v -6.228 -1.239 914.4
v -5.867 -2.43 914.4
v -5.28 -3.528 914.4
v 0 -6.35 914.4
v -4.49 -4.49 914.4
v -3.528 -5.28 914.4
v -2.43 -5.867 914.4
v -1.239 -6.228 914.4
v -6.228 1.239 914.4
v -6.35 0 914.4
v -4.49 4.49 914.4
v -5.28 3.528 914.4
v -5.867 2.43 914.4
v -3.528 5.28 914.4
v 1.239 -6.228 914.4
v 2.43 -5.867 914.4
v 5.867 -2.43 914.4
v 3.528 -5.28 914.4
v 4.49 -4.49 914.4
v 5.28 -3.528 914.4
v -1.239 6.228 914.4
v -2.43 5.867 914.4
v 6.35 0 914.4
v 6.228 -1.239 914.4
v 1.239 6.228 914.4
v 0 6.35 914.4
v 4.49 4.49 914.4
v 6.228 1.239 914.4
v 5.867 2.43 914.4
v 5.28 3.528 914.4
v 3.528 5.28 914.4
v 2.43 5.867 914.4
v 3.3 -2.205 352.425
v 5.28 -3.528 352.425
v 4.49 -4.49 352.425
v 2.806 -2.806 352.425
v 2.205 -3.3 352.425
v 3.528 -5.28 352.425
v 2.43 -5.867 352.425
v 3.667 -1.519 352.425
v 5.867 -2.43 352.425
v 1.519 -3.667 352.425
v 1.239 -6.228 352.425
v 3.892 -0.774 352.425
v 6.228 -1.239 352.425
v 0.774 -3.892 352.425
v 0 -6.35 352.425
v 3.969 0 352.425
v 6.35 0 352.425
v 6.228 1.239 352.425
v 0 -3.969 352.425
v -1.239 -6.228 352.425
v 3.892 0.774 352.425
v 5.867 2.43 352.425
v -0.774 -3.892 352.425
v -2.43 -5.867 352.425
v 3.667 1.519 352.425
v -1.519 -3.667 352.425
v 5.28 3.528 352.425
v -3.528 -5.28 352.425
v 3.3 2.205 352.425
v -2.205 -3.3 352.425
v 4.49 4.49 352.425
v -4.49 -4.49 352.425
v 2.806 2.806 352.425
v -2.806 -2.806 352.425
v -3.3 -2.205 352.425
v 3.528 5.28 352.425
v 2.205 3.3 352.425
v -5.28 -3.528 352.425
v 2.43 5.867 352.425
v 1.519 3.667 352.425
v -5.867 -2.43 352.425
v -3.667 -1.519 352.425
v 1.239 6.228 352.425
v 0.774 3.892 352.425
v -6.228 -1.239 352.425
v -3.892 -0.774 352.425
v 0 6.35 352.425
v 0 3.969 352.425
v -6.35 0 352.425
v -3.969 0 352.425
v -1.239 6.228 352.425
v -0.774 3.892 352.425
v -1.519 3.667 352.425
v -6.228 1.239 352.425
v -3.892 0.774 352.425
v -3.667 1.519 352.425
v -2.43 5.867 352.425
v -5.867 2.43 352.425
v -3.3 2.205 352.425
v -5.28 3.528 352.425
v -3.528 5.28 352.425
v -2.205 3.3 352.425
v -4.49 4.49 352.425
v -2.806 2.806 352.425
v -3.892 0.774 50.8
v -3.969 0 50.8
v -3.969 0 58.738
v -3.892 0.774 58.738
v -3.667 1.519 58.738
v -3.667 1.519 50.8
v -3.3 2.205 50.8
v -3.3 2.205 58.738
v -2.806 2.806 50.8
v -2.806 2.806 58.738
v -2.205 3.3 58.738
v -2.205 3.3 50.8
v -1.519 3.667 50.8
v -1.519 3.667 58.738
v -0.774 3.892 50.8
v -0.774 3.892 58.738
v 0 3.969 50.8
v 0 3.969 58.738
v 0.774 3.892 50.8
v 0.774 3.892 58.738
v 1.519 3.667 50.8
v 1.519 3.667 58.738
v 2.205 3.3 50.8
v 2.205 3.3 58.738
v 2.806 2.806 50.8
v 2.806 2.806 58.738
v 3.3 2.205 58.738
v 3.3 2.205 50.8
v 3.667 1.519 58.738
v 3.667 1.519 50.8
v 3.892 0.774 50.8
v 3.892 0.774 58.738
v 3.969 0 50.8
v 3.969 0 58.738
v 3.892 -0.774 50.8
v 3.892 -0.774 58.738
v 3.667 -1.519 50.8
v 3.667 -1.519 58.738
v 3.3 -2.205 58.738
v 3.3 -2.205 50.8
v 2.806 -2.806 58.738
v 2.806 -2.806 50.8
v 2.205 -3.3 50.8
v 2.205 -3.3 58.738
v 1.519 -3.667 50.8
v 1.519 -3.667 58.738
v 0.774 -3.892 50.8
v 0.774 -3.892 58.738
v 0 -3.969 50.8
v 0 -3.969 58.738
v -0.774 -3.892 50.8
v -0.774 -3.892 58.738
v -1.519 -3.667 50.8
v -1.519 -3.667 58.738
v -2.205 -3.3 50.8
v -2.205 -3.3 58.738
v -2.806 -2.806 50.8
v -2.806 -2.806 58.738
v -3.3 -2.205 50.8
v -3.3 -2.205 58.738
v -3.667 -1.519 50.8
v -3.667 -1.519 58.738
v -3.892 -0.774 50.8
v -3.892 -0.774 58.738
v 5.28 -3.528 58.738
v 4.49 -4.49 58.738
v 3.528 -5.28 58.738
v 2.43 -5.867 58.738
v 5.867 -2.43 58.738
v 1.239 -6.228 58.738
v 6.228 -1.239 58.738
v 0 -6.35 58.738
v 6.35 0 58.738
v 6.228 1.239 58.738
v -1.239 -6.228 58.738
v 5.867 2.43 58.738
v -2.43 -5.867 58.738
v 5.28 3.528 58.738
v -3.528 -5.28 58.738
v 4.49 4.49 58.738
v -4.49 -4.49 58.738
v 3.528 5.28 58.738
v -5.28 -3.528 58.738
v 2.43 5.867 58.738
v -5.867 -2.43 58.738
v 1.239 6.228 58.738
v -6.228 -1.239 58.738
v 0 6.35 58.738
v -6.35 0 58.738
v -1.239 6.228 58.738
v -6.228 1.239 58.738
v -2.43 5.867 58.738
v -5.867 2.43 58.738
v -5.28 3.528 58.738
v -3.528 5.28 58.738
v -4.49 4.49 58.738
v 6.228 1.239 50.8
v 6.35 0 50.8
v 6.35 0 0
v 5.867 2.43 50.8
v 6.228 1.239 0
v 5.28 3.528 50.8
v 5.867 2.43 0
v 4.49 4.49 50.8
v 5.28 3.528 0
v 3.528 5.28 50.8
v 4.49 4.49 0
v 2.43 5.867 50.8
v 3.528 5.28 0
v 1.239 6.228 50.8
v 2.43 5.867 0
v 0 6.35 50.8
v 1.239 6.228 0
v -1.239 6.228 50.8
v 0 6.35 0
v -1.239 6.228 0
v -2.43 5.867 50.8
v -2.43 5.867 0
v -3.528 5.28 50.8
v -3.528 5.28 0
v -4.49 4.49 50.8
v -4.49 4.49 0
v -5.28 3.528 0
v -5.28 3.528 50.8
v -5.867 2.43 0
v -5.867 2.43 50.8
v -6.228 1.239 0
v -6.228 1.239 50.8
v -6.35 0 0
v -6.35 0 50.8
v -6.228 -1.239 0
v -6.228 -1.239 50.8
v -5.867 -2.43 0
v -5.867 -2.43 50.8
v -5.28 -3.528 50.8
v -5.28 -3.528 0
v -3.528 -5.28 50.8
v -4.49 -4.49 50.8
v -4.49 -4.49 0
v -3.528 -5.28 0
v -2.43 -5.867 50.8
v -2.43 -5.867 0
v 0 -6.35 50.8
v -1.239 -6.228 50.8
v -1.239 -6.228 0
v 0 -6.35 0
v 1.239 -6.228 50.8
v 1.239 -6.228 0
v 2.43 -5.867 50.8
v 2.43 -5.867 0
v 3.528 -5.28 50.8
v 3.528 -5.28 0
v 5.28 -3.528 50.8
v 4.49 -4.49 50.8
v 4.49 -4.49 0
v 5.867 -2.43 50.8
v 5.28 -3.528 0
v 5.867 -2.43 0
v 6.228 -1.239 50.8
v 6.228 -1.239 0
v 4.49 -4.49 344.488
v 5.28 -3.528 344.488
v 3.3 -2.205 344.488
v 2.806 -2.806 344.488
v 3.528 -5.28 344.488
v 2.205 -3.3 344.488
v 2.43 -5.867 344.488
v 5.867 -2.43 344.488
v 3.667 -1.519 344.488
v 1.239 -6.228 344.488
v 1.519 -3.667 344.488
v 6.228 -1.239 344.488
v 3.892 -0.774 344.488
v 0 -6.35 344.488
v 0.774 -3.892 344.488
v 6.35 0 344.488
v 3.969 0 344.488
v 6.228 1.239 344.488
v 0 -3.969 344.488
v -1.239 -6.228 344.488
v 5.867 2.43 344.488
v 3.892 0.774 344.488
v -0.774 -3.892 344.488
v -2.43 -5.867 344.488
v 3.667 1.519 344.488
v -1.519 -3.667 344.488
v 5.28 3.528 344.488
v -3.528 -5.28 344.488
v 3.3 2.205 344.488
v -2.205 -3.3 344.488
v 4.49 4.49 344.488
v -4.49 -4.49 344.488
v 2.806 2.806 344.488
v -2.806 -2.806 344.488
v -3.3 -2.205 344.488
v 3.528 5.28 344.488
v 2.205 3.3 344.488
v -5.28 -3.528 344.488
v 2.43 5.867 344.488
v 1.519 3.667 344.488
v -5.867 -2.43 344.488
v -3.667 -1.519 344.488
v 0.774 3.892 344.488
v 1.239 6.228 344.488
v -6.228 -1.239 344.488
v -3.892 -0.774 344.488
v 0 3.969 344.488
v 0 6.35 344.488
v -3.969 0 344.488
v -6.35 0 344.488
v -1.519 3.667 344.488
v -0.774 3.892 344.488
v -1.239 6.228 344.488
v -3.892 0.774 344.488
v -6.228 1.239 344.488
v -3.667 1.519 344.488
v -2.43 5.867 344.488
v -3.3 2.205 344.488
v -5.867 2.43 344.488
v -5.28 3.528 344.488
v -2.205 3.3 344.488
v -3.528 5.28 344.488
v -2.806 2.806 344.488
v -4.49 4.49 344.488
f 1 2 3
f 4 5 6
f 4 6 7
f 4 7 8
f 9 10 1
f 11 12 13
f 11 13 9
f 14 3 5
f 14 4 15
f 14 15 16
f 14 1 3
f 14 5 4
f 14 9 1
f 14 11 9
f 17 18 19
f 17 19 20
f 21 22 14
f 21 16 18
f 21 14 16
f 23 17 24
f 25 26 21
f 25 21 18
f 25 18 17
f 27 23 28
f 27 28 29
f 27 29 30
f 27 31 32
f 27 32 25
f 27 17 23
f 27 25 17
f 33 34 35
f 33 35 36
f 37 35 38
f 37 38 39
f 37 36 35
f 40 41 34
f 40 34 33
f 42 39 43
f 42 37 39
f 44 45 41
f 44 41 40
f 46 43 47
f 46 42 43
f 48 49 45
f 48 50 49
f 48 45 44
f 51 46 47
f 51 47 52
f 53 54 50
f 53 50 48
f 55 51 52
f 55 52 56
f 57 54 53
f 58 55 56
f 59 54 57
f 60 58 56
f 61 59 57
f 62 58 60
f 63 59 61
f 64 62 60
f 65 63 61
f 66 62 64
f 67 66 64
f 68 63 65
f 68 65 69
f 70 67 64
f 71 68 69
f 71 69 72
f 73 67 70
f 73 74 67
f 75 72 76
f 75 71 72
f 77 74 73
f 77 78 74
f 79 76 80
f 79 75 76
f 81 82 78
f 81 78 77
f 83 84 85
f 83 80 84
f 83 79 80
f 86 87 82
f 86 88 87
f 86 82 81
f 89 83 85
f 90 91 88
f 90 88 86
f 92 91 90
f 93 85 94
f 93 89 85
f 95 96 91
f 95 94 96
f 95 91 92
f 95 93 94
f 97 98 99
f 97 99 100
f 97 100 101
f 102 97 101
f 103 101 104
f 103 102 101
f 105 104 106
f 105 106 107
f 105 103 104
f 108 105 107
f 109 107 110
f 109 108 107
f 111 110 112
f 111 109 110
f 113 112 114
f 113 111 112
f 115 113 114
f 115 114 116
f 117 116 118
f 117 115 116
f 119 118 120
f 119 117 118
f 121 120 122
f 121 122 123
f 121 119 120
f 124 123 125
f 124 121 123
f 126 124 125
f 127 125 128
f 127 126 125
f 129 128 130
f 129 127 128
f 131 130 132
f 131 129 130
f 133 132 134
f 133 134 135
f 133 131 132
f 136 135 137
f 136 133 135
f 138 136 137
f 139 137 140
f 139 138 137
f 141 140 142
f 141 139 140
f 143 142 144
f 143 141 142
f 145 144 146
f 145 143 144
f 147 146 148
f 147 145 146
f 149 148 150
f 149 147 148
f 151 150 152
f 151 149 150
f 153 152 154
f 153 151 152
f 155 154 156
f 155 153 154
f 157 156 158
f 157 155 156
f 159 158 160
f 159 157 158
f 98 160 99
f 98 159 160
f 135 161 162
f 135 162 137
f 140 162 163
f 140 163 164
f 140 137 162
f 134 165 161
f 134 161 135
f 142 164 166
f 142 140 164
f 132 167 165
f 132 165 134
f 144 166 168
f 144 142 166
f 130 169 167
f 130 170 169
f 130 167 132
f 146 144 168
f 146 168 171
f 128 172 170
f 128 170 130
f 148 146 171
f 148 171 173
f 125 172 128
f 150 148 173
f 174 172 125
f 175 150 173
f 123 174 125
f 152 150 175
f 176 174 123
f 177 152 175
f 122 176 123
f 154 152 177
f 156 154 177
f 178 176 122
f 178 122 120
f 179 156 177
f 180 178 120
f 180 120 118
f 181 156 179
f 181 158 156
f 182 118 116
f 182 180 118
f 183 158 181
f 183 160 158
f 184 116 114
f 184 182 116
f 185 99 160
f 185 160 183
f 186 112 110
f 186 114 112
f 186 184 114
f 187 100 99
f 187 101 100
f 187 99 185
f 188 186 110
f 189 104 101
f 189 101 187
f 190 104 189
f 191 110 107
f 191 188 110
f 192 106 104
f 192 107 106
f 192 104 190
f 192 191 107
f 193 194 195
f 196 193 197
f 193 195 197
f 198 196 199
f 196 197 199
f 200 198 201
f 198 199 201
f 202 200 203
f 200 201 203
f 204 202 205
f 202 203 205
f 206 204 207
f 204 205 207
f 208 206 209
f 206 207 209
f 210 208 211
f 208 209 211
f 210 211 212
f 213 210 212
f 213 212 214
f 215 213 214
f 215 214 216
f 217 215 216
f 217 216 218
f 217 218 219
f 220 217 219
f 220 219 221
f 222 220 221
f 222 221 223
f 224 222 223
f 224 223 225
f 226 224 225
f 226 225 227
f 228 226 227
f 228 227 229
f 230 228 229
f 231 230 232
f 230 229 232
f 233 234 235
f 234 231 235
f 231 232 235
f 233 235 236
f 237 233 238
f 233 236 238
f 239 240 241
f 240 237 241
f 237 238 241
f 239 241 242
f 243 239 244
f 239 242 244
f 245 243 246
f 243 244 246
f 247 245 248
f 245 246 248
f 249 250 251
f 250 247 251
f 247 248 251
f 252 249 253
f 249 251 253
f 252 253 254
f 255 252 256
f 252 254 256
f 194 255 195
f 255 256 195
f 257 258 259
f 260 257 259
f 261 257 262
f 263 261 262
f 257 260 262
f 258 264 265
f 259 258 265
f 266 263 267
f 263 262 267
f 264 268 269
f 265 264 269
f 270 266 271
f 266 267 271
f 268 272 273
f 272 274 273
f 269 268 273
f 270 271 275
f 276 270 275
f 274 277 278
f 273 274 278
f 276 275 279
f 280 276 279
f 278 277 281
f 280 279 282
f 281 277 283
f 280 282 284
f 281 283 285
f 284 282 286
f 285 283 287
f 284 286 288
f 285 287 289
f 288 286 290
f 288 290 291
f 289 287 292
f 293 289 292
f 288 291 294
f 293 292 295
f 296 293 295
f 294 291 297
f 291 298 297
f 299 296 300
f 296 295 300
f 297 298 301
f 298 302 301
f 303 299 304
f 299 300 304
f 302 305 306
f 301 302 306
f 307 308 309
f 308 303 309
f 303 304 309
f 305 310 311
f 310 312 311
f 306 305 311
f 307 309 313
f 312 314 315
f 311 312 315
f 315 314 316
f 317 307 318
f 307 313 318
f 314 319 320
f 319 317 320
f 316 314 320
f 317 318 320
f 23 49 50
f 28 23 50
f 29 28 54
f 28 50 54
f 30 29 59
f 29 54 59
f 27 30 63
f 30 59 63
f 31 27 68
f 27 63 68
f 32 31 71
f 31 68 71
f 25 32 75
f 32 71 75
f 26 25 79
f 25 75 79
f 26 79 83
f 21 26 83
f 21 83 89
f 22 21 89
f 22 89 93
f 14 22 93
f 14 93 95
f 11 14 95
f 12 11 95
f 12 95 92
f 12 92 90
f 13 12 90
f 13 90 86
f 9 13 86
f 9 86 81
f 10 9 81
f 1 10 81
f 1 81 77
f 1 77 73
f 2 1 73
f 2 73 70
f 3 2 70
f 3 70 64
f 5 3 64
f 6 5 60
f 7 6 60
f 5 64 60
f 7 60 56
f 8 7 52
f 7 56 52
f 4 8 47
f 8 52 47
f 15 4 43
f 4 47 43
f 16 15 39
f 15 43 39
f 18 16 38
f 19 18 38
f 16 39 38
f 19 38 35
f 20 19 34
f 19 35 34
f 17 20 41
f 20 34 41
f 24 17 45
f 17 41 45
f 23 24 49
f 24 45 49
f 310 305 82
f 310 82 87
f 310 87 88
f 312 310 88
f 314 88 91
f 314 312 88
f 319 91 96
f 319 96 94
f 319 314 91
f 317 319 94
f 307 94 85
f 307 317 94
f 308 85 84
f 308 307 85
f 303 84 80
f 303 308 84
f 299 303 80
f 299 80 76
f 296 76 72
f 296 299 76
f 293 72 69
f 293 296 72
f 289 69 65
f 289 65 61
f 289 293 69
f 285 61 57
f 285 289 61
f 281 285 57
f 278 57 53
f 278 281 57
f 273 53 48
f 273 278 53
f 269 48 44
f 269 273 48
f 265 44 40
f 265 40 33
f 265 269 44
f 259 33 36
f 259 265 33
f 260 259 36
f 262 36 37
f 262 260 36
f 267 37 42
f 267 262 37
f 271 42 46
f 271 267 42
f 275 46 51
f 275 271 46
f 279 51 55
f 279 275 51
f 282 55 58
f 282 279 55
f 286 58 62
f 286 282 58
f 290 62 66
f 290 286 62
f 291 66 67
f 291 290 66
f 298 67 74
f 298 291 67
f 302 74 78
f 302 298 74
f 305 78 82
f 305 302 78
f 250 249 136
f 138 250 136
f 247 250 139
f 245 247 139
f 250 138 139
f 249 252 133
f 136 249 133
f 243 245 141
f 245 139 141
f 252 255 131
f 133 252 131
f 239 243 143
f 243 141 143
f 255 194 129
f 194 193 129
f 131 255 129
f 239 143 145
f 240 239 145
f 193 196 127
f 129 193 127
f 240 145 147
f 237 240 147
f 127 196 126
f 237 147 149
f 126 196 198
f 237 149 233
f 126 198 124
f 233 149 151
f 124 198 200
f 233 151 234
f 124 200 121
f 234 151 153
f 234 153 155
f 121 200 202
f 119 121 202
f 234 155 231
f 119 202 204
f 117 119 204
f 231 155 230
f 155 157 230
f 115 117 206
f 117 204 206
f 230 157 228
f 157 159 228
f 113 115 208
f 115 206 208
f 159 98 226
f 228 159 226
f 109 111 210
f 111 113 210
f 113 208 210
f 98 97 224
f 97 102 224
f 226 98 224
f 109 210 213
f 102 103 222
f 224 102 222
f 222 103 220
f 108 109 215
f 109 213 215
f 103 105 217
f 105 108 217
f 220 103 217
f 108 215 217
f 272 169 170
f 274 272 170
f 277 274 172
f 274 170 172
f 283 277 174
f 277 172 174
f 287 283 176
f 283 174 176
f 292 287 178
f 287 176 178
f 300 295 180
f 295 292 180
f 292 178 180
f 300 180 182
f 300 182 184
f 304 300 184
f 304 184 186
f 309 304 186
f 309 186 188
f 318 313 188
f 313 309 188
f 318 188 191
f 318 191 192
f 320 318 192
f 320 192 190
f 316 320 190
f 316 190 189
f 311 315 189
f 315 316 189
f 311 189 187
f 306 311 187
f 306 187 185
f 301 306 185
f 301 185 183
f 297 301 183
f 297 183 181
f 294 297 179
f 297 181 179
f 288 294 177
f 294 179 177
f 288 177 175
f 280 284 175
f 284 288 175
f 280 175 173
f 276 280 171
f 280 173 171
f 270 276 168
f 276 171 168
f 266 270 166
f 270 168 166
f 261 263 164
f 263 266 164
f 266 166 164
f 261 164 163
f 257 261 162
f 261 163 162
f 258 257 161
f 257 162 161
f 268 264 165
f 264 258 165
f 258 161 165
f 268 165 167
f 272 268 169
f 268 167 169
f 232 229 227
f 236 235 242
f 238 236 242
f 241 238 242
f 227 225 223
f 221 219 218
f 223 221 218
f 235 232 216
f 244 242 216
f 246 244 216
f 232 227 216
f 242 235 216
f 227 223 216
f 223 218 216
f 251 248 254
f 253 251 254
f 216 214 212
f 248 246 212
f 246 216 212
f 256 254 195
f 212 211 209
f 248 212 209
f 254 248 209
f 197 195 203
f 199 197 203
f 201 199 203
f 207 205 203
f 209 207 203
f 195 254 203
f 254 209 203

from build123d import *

# Parameters (mm, degrees)
SKETCH1_R           = 6.35
BOSS_EXTRUDE1_DEPTH = 914.4
SKETCH3_R           = 6.35
SKETCH3_R_2         = 3.96875
CUT_EXTRUDE1_DEPTH  = 7.9375
SKETCH4_R           = 6.35
SKETCH4_R_2         = 3.96875
CUT_EXTRUDE2_DEPTH  = 7.9375


with BuildPart() as part:
    # Sketch1 → Boss-Extrude1 (new body)
    with BuildSketch(Plane.XY):
        Circle(SKETCH1_R)
    extrude(amount=BOSS_EXTRUDE1_DEPTH)

    # Sketch3 → Cut-Extrude1 (cut)
    with BuildSketch(Plane(origin=(0, 0, 50.8), x_dir=(-1, 0, 0), z_dir=(0, 0, -1))):
        Circle(SKETCH3_R)
        Circle(SKETCH3_R_2, mode=Mode.SUBTRACT)
    extrude(amount=-CUT_EXTRUDE1_DEPTH, mode=Mode.SUBTRACT)

    # Sketch4 → Cut-Extrude2 (cut)
    with BuildSketch(Plane(origin=(0, 0, 344.4875), x_dir=(-1, 0, 0), z_dir=(0, 0, -1))):
        Circle(SKETCH4_R)
        Circle(SKETCH4_R_2, mode=Mode.SUBTRACT)
    extrude(amount=-CUT_EXTRUDE2_DEPTH, mode=Mode.SUBTRACT)


solid = part.part
